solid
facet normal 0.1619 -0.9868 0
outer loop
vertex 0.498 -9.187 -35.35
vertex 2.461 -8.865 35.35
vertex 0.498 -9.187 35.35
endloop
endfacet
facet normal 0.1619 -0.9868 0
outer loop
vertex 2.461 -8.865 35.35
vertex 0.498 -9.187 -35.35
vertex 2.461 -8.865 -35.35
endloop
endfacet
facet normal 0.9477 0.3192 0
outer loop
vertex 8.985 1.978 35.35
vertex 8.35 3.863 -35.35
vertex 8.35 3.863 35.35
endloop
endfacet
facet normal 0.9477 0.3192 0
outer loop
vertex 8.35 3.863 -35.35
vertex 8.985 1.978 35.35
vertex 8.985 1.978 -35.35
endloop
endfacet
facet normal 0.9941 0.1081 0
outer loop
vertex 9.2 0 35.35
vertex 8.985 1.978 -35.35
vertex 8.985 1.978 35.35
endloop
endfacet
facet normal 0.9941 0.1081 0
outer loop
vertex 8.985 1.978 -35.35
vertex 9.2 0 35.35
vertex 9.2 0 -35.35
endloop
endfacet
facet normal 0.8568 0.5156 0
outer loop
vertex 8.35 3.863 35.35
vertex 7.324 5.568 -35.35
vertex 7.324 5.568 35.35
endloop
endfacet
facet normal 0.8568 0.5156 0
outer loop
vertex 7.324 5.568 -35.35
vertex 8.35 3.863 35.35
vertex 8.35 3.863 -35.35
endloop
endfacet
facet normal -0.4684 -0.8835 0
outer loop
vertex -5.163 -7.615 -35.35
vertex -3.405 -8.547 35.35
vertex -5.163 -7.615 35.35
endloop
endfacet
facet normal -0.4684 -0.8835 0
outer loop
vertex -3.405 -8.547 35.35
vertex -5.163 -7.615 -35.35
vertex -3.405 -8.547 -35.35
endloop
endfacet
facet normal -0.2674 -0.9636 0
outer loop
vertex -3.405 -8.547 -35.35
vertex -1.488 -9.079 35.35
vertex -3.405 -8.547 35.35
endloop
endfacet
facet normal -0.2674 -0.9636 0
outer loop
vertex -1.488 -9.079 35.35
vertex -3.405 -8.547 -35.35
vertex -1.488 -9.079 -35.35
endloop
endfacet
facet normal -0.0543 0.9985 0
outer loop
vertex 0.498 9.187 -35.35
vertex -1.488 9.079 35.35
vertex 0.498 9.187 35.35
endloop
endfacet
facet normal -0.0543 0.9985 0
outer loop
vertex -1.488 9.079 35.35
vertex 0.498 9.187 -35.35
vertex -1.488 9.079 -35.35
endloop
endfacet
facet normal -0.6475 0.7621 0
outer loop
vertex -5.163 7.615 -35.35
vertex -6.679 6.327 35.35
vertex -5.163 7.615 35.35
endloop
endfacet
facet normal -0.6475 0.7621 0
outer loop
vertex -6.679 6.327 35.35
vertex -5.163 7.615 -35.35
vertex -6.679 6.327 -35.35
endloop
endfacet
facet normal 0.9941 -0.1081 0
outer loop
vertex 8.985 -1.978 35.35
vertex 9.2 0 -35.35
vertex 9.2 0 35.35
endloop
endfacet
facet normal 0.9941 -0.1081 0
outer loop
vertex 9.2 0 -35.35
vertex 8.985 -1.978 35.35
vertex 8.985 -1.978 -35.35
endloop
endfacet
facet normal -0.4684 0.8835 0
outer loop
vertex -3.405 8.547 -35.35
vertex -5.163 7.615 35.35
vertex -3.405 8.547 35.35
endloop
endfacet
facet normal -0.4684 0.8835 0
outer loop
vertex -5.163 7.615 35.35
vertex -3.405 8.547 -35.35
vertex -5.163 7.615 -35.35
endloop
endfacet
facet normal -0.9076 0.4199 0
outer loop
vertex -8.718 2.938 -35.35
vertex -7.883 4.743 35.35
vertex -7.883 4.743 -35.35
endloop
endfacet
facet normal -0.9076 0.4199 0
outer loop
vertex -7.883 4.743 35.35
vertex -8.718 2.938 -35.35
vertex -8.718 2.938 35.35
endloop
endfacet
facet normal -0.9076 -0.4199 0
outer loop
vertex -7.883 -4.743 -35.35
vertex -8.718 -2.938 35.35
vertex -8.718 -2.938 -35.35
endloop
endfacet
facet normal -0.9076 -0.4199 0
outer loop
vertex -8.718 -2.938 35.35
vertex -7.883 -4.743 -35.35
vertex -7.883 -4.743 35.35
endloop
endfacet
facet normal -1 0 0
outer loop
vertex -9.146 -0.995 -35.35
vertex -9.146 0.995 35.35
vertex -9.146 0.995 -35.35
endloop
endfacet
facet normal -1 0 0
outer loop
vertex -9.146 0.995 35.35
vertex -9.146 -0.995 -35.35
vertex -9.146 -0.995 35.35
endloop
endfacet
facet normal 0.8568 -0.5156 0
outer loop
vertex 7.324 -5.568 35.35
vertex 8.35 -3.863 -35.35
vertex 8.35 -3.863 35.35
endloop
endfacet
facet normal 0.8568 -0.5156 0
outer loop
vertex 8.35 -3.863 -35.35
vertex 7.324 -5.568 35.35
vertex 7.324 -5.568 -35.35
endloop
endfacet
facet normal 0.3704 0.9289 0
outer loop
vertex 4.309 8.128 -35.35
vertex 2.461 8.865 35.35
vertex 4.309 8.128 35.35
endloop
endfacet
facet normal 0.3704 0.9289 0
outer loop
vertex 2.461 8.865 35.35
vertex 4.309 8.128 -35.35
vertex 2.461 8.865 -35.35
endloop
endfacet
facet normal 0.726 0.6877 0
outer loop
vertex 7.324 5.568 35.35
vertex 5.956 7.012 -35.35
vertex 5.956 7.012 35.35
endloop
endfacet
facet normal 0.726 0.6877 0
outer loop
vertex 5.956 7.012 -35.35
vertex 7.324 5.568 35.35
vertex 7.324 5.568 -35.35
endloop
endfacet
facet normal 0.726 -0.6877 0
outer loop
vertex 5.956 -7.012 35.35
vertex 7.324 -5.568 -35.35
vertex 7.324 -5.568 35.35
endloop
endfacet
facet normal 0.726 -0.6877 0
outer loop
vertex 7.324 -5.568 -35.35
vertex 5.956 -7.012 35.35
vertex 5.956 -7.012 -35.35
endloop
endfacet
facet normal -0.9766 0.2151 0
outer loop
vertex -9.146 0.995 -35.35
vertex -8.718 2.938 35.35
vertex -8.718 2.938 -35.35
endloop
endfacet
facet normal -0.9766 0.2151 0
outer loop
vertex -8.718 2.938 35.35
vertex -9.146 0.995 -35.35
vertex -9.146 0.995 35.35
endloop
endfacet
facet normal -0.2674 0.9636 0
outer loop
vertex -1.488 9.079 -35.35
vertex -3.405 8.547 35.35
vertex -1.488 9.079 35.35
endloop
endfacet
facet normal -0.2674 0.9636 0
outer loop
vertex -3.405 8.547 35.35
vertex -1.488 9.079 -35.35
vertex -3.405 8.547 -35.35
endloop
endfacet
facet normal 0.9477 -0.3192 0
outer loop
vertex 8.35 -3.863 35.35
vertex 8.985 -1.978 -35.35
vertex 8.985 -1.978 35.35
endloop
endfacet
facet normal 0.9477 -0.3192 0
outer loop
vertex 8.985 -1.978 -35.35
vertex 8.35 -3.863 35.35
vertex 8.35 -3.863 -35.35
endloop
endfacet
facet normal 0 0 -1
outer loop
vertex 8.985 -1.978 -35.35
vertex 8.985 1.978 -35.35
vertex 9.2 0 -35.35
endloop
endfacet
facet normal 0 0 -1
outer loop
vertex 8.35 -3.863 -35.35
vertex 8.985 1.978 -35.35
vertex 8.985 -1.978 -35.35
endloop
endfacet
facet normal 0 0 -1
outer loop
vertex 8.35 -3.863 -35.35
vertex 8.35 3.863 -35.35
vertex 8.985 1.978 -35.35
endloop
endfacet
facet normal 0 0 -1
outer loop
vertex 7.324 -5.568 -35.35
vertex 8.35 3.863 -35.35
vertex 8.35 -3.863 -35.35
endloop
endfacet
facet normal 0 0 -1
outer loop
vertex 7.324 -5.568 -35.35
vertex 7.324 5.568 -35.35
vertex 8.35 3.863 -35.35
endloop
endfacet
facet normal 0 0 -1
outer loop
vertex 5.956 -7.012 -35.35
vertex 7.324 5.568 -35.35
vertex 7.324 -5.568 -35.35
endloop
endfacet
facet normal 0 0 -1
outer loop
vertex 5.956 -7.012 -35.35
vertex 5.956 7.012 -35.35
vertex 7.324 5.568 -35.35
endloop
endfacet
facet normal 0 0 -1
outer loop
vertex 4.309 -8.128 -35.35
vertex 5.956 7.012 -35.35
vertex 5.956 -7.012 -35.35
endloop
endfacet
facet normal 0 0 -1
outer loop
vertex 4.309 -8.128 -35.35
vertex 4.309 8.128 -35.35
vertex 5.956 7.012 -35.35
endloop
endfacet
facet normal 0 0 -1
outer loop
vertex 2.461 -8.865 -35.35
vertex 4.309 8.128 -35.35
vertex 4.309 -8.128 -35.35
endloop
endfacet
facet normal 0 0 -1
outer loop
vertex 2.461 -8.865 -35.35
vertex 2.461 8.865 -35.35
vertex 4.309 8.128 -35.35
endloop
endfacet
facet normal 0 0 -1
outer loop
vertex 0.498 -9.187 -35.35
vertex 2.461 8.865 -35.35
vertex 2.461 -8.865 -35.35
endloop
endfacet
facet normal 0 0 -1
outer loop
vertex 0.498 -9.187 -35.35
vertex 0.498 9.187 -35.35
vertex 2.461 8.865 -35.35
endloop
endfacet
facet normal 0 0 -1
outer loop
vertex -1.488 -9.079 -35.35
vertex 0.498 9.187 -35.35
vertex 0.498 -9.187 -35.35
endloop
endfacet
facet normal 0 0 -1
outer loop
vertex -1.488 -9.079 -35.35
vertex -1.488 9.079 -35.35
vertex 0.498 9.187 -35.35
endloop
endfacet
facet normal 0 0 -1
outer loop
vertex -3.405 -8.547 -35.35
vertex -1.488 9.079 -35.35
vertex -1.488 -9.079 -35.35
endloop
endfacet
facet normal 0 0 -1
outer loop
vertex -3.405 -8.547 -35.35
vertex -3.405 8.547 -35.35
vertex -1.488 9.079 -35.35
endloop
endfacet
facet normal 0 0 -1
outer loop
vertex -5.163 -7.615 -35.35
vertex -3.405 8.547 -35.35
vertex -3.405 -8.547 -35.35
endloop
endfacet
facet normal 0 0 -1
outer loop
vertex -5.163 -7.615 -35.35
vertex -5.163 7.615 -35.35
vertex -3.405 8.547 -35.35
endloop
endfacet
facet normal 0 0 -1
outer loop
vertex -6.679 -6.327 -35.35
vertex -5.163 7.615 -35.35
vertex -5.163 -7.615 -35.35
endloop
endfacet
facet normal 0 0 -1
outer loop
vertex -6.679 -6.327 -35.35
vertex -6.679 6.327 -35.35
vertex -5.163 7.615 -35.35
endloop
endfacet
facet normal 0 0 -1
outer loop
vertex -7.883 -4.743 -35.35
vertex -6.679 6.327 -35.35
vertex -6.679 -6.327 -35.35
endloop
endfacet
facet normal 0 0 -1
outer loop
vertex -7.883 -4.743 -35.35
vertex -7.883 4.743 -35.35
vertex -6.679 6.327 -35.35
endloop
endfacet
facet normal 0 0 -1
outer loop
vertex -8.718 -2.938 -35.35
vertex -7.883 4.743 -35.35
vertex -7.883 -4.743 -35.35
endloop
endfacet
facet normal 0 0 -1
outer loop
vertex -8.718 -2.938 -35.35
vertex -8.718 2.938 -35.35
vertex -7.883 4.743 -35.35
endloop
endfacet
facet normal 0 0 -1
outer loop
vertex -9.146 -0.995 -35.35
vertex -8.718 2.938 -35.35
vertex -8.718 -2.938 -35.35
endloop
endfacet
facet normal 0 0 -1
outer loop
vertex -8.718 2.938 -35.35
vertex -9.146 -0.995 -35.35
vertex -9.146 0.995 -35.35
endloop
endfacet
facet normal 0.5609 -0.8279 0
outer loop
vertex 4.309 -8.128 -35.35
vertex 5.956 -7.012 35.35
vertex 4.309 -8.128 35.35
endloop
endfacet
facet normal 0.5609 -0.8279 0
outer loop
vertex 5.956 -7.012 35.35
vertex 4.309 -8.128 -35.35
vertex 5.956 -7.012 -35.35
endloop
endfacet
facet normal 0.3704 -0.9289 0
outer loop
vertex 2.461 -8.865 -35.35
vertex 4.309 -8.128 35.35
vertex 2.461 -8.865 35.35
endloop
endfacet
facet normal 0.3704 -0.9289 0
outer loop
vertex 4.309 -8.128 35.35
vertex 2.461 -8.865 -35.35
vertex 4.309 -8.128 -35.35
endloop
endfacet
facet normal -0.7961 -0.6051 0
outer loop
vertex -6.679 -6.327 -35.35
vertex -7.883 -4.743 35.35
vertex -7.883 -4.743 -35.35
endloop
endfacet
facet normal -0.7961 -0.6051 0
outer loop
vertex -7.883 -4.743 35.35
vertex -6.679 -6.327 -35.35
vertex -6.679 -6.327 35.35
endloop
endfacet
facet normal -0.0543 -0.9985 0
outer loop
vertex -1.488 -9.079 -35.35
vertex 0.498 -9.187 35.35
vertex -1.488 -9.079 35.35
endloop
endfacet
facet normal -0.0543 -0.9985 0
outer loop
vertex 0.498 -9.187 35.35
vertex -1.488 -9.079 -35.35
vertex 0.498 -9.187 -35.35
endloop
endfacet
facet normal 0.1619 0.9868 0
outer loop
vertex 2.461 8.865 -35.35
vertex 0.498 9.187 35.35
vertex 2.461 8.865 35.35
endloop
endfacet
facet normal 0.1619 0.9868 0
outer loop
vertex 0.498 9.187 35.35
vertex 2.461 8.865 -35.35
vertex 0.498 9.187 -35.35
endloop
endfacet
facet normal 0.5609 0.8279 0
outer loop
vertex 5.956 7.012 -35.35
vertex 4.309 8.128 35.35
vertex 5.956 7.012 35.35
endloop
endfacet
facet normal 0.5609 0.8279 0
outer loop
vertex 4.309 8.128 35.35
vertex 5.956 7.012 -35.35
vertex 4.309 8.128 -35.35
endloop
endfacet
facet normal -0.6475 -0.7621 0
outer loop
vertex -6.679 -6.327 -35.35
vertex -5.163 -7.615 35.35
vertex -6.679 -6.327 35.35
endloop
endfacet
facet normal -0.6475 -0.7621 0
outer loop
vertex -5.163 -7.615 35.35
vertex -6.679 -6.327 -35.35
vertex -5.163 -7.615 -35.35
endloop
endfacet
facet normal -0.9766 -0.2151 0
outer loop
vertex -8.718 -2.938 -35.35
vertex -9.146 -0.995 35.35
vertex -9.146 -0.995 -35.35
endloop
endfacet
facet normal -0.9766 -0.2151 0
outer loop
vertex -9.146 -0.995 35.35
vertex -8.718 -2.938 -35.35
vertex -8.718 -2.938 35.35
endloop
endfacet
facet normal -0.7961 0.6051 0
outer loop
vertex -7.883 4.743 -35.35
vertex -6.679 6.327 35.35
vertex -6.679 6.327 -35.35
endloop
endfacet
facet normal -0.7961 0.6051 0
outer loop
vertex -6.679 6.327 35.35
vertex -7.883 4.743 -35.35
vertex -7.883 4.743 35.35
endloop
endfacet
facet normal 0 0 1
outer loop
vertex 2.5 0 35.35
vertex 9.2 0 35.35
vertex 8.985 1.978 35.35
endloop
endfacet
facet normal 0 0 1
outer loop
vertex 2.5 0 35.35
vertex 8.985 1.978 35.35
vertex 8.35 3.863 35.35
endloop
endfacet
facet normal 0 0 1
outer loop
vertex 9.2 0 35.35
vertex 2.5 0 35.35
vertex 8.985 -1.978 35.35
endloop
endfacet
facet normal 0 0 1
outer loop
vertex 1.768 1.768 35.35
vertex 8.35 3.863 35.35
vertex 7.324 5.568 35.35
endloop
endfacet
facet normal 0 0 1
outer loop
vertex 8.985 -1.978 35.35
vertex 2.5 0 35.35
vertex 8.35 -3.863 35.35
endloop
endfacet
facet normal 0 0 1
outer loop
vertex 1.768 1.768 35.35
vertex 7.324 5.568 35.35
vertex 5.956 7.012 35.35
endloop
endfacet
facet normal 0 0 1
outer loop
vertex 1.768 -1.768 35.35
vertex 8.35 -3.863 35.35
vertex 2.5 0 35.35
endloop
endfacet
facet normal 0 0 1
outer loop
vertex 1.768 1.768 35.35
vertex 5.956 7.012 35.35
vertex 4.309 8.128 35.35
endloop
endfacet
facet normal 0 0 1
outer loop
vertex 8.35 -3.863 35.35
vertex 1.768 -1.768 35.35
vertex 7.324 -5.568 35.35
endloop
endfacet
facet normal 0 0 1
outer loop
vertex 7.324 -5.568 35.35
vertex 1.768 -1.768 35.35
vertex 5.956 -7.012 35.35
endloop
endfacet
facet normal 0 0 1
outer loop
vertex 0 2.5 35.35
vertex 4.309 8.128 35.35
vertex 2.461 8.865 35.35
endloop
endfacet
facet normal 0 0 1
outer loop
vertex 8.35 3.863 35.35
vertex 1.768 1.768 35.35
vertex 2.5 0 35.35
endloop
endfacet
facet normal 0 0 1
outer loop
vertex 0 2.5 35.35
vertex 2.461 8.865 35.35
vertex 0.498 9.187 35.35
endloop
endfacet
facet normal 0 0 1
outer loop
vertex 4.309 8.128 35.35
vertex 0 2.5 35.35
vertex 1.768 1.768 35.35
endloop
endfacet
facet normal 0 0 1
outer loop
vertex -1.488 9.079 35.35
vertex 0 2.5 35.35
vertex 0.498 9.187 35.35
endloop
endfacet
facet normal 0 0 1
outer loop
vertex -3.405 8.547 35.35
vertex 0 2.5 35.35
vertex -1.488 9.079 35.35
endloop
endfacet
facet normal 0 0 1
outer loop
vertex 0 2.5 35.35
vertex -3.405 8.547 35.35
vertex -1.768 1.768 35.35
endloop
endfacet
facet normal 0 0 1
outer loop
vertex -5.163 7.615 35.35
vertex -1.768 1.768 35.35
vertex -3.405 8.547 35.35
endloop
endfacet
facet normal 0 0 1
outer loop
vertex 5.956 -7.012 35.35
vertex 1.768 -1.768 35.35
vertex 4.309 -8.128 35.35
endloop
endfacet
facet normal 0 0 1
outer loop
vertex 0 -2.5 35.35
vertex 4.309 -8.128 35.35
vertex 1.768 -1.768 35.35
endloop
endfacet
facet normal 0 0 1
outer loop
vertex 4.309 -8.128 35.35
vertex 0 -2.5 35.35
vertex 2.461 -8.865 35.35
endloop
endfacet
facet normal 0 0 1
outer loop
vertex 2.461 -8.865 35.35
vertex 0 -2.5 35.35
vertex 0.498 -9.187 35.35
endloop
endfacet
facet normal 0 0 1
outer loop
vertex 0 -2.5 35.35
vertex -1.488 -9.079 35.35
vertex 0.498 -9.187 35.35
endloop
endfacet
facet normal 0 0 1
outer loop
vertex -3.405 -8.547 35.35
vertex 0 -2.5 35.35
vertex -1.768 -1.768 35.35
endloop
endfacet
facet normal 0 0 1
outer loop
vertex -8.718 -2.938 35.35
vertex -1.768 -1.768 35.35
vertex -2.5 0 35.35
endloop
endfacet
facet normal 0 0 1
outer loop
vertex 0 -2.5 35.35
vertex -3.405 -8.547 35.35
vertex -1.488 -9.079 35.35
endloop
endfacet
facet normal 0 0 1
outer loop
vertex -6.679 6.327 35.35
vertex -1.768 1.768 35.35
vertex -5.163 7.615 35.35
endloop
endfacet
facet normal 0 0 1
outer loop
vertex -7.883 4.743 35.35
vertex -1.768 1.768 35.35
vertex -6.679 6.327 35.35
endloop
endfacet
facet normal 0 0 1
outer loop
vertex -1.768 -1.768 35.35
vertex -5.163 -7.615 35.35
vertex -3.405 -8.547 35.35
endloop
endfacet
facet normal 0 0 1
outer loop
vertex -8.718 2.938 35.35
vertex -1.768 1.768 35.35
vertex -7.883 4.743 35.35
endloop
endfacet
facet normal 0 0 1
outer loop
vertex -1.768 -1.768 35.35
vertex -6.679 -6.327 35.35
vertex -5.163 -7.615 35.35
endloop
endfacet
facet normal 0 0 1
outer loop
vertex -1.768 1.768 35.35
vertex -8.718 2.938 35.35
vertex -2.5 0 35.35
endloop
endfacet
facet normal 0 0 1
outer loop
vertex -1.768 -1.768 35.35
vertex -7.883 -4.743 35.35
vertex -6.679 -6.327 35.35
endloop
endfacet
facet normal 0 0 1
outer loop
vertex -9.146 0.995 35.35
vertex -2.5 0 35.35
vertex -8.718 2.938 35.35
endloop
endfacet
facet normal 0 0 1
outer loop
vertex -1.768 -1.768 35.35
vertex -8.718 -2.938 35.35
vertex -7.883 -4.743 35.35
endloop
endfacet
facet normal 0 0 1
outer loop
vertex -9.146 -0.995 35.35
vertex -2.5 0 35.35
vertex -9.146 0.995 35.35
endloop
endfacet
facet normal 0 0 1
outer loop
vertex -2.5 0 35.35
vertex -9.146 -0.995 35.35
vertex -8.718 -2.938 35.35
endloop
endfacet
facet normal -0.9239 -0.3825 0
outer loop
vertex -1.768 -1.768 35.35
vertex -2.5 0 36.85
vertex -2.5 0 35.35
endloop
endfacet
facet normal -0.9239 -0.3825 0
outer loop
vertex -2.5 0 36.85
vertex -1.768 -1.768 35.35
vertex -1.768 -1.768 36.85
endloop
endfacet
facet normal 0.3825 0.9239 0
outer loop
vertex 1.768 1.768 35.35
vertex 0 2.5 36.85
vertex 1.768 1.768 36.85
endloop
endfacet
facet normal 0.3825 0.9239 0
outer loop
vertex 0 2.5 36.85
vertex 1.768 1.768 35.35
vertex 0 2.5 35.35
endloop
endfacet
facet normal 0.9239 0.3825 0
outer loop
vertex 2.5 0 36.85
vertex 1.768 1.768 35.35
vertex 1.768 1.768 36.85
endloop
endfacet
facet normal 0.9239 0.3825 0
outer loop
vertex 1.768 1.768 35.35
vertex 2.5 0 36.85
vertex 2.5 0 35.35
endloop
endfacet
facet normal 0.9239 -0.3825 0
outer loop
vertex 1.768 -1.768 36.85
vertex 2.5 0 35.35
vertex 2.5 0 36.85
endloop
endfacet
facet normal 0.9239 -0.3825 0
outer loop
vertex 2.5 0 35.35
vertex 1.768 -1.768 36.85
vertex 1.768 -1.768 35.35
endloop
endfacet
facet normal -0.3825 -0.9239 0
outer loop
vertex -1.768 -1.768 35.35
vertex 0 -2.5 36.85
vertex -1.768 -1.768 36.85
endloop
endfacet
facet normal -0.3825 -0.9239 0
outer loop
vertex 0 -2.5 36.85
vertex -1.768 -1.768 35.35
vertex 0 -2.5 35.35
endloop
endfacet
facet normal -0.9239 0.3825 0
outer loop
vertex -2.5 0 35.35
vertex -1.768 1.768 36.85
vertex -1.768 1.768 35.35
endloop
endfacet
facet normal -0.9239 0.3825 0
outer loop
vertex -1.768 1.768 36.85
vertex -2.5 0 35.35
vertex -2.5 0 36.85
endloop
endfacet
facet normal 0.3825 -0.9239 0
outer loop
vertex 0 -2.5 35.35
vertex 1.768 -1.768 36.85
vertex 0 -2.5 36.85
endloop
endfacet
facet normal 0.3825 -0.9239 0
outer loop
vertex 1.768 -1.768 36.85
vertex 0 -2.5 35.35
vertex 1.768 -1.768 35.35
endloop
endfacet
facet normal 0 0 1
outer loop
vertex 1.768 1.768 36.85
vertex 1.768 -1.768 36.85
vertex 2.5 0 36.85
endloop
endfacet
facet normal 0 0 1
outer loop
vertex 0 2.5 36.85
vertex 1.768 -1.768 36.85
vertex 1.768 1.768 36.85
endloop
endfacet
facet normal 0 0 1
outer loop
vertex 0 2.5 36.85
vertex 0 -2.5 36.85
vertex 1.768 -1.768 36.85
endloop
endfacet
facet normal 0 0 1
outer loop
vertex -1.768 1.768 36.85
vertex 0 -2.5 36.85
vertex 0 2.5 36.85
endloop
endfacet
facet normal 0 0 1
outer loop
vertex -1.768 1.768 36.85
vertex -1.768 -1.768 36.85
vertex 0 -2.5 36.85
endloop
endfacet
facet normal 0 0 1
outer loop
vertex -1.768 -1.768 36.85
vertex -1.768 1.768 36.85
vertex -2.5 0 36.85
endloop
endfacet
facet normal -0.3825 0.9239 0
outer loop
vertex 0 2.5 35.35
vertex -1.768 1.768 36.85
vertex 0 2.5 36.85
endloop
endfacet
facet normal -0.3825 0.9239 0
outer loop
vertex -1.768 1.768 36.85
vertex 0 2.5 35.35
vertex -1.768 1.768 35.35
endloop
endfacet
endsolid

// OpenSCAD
// Parameters for the cylindrical battery cell
battery_height = 70.7;
battery_diameter = 18.4;
terminal_button_height = 1.5;
terminal_button_diameter = 5.0;
negative_terminal_height = 0.5;

// Main battery cell body
module cylindrical_cell_body() {
    cylinder(h = battery_height, d = battery_diameter, center = true);
}

// Positive terminal button
module positive_terminal_button() {
    translate([0, 0, battery_height / 2])
        cylinder(h = terminal_button_height, d = terminal_button_diameter, center = false);
}

// Negative terminal flat end
module negative_terminal_flat_end() {
    translate([0, 0, -battery_height / 2])
        cylinder(h = negative_terminal_height, d = battery_diameter, center = false);
}

// Complete battery model
module battery() {
    cylindrical_cell_body();
    positive_terminal_button();
    negative_terminal_flat_end();
}

// Render the battery
battery();
